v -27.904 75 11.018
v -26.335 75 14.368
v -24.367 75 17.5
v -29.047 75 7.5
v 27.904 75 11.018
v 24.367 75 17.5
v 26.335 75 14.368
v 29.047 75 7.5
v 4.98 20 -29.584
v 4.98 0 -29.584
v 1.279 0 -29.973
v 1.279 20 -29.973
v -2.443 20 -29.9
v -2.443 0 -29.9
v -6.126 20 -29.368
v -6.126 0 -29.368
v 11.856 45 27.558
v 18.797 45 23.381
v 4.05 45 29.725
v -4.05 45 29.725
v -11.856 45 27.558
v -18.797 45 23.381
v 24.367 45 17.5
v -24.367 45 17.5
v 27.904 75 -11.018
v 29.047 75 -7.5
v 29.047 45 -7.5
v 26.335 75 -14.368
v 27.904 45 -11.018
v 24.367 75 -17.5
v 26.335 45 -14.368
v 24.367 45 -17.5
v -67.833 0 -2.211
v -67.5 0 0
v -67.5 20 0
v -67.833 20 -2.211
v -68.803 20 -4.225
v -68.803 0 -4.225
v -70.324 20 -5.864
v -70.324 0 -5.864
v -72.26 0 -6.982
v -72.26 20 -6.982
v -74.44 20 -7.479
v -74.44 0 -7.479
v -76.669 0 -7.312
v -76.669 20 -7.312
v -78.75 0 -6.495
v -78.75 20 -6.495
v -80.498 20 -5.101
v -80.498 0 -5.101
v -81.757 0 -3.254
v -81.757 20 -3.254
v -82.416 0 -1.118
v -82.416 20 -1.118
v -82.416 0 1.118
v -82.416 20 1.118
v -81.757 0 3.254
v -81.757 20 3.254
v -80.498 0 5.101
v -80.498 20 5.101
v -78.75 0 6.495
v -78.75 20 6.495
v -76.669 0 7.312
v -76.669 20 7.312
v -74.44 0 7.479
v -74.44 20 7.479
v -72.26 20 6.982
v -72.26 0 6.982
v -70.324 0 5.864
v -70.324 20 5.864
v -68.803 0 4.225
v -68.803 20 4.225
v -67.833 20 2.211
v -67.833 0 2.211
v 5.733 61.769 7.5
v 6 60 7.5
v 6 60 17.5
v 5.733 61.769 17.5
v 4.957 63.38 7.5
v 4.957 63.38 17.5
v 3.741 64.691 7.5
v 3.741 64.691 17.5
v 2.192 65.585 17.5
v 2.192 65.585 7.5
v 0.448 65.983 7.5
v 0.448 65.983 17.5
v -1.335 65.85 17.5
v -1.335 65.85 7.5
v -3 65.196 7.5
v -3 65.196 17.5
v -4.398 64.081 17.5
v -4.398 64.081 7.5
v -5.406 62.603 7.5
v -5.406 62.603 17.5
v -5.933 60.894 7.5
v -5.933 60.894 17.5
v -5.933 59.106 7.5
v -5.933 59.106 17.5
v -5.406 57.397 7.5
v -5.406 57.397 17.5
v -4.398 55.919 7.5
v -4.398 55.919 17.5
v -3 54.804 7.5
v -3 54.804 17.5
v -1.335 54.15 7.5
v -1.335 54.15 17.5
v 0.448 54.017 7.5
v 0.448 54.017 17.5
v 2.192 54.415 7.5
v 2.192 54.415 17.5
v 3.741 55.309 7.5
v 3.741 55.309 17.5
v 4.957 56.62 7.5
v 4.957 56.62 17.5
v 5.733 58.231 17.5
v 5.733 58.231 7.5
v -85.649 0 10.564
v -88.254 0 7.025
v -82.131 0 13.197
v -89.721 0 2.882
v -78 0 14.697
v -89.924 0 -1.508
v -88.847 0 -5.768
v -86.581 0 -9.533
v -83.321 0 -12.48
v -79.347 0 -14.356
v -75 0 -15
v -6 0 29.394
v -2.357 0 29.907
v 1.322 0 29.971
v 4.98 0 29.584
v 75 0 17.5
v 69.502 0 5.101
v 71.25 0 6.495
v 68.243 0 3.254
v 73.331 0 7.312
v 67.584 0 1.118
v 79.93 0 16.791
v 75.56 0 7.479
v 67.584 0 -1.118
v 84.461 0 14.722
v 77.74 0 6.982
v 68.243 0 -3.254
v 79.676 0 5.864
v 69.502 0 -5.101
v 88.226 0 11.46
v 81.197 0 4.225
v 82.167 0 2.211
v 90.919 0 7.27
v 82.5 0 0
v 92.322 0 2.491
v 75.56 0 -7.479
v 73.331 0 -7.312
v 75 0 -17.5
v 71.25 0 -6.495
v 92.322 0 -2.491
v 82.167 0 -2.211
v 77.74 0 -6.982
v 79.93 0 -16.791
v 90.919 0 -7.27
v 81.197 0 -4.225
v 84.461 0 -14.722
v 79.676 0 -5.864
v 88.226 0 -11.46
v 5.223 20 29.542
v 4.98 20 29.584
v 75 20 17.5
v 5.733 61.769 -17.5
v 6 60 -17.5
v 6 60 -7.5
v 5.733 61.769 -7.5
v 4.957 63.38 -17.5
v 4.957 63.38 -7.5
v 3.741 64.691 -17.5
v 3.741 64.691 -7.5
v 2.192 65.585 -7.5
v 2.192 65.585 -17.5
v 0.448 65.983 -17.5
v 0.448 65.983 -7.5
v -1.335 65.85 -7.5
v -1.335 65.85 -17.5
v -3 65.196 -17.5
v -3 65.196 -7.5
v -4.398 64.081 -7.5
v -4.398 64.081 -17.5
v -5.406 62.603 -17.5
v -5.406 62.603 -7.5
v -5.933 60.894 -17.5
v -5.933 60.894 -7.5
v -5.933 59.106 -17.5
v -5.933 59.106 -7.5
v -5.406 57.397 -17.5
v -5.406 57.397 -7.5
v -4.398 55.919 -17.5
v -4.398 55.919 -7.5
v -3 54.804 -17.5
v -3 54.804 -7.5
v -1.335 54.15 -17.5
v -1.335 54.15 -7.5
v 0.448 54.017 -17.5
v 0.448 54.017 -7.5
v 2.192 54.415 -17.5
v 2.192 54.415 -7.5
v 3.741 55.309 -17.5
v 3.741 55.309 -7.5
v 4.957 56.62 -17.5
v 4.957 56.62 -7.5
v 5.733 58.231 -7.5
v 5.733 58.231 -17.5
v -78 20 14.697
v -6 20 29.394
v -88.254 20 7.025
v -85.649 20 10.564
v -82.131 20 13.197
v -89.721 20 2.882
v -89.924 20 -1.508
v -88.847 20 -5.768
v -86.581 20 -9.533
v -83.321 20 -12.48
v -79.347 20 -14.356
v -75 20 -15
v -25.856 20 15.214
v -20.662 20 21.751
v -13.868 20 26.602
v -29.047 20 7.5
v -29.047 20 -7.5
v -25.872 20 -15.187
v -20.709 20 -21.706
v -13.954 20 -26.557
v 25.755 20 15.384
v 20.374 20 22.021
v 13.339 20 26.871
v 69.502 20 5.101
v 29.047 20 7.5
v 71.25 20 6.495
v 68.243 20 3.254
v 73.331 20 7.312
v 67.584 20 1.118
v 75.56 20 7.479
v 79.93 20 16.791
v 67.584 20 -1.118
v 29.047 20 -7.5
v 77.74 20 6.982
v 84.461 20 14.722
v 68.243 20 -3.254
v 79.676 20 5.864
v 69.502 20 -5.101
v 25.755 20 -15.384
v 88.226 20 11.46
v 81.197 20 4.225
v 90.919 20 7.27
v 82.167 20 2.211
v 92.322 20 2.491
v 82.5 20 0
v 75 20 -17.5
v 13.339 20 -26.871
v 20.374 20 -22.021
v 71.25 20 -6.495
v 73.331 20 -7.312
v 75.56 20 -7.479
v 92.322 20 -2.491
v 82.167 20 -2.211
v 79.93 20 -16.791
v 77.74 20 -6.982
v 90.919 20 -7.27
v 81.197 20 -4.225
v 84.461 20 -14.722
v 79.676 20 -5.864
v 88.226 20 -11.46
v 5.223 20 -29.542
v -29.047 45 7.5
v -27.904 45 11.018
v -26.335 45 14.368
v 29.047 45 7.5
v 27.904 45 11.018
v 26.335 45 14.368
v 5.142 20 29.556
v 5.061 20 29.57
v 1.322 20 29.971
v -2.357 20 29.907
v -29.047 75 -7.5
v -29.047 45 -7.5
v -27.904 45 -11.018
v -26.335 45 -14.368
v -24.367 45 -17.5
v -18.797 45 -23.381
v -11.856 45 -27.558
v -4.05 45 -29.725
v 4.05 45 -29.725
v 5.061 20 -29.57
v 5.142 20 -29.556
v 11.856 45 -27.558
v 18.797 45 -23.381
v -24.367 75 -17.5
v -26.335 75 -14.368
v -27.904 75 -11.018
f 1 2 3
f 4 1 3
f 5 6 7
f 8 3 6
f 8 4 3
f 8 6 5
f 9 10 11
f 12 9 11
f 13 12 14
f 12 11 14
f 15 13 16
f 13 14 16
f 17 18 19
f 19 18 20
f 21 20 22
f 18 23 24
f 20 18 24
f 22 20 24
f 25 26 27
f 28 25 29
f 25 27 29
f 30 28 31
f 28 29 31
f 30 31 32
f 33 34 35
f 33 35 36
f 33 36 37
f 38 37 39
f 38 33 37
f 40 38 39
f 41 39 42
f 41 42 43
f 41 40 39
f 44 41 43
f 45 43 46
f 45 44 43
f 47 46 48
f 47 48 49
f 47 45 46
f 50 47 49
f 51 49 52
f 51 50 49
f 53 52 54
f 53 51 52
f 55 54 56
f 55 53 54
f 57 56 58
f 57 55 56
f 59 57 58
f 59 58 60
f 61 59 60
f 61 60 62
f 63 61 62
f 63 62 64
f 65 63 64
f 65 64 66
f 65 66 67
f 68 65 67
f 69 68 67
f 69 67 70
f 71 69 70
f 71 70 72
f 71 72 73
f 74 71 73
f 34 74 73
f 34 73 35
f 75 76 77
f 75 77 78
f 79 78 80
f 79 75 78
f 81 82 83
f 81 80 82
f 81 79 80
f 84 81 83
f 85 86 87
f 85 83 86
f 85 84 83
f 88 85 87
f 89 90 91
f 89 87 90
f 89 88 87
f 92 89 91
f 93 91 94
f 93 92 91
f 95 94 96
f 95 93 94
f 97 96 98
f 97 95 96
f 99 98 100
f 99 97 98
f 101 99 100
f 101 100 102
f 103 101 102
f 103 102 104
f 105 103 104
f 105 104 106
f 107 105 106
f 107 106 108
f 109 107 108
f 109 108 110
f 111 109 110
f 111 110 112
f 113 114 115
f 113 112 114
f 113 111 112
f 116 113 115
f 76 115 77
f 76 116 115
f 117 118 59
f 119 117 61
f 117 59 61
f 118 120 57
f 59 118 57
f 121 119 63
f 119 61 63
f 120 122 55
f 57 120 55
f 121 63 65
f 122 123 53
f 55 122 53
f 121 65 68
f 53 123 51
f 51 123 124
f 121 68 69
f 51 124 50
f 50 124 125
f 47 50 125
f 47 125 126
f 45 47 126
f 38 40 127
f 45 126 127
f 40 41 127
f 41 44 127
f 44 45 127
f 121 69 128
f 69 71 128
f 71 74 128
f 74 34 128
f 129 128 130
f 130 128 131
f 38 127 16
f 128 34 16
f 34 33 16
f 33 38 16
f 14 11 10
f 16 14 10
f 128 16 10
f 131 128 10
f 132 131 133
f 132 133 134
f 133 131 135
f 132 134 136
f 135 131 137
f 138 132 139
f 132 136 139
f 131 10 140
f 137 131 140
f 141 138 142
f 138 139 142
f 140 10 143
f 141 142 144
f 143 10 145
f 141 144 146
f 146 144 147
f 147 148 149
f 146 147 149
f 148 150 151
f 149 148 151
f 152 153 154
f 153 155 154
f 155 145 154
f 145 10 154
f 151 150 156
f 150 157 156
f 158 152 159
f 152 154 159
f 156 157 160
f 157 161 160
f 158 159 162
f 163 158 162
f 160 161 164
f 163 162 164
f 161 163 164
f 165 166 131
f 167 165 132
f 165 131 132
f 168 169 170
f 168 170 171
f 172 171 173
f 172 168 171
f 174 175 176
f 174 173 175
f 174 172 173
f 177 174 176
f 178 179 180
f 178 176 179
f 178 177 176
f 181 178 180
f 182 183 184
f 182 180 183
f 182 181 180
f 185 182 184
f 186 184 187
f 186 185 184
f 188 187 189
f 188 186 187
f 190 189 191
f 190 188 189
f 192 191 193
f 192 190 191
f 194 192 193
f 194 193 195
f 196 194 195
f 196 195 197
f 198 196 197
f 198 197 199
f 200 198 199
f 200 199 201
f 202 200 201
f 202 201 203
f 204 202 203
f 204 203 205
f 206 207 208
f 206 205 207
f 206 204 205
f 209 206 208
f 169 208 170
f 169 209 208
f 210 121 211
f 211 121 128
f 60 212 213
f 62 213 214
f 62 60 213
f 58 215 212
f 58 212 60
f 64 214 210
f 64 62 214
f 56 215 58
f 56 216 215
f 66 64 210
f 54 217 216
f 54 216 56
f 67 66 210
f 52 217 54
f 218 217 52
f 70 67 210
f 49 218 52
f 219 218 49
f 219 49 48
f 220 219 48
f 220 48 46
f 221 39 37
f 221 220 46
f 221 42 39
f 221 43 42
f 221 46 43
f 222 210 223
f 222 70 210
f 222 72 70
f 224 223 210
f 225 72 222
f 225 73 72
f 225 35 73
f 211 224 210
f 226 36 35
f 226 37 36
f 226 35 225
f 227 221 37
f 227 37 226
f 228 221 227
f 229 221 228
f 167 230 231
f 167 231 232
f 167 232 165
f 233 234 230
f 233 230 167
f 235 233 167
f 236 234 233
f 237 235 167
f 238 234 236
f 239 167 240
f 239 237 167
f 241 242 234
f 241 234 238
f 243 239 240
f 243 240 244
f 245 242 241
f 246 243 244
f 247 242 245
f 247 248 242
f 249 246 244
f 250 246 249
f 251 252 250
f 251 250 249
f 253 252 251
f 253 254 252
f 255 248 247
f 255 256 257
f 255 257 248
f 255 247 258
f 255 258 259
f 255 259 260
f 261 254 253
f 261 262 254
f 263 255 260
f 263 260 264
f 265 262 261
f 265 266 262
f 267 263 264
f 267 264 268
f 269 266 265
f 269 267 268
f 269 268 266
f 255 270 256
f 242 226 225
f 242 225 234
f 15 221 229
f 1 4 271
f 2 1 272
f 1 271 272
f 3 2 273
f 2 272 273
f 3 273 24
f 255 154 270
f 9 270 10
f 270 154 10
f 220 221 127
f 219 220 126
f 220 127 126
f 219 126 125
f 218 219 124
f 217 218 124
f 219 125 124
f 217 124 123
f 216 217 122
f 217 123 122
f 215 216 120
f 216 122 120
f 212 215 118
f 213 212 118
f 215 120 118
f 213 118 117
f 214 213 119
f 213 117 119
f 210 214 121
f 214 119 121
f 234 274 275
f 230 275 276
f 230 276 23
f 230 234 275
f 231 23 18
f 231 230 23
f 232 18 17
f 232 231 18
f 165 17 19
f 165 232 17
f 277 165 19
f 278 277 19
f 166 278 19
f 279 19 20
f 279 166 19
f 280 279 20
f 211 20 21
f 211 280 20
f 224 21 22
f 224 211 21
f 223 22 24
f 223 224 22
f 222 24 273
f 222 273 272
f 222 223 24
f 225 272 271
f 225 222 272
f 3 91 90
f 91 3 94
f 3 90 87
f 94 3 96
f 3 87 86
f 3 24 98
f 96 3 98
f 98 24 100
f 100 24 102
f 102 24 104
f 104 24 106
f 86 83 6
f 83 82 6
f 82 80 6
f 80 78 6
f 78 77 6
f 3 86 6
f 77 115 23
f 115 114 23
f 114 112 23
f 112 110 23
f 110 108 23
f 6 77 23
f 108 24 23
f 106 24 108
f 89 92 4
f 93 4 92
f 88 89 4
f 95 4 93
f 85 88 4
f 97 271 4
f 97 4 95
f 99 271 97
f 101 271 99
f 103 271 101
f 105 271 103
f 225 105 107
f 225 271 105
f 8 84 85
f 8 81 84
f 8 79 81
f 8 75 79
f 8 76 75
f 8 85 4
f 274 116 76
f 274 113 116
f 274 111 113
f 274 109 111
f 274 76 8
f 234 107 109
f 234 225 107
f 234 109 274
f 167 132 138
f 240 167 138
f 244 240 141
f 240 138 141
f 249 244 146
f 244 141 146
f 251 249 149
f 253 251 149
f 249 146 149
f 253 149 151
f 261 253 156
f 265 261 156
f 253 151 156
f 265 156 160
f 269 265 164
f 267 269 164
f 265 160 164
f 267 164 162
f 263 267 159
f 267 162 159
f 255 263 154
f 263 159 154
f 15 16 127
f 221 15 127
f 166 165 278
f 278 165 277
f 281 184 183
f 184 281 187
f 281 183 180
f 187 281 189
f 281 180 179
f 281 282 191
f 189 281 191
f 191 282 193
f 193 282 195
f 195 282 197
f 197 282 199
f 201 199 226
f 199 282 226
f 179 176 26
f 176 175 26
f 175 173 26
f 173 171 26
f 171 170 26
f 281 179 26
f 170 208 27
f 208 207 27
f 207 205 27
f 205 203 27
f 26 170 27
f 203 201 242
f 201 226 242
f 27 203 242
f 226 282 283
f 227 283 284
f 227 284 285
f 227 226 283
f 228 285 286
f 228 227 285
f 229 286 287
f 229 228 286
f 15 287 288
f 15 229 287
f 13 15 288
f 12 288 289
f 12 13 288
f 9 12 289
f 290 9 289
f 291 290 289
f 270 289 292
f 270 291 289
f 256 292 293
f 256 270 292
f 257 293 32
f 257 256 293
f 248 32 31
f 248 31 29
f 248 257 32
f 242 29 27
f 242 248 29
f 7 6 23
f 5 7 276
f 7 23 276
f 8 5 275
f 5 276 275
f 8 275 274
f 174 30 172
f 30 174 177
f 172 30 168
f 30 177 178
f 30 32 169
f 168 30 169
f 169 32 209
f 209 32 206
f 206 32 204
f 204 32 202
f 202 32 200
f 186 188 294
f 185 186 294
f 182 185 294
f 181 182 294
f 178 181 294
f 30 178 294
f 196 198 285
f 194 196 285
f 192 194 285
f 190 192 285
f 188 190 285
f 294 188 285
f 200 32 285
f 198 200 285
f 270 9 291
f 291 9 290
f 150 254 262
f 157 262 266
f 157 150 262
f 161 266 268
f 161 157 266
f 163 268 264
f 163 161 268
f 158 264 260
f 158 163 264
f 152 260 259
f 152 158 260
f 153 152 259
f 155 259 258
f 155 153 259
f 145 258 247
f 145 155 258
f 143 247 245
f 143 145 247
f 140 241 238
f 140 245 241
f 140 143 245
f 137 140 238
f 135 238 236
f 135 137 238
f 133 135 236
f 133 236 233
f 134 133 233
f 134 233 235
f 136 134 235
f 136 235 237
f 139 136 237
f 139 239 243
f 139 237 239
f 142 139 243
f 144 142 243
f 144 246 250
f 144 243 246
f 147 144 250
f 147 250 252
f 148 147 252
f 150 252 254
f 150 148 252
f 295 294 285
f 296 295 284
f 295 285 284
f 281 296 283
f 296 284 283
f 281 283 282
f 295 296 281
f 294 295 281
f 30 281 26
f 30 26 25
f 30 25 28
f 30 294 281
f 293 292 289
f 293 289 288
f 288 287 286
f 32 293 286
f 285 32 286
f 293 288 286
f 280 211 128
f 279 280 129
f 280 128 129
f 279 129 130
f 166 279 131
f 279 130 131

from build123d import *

# Parameters (mm, degrees)
SALIENTE_EXTRUIR1_OUTLINE_R = 7.5
SALIENTE_EXTRUIR1_DEPTH     = 20
SALIENTE_EXTRUIR2_START     = 20
CROQUIS2_4_R                = 7.5
SALIENTE_EXTRUIR2_DEPTH     = 25
SALIENTE_EXTRUIR3_START     = 45
SALIENTE_EXTRUIR3_DEPTH     = 30
CORTAR_EXTRUIR1_DEPTH       = 123.805740908
CORTAR_EXTRUIR1_DEPTH_BACK  = 123.805740908
CROQUIS3_R                  = 6


# Read off the part's stored shape, not the designer's step: Saliente-Extruir1
with BuildPart() as part:
    # Saliente-Extruir1 outline → Saliente-Extruir1 (new body)
    with BuildSketch(Plane(origin=(0, 0, 0), x_dir=(1, 0, 0), z_dir=(0, 1, 0))):
        with BuildLine():
            Line((75, 17.5), (4.980303505, 29.583721487))
            ThreePointArc((4.980303505, 29.583721487), (-0.583157592, 29.994331585), (-6.126453941, 29.367781021))
            Line((-6.126453941, 29.367781021), (-75, 15))
            ThreePointArc((-75, 15), (-89.924042295, 1.50763443), (-78, -14.696938457))
            Line((-78, -14.696938457), (-6, -29.393876913))
            ThreePointArc((-6, -29.393876913), (-0.518609175, -29.995517074), (4.980303505, -29.583721487))
            Line((4.980303505, -29.583721487), (75, -17.5))
            ThreePointArc((75, -17.5), (92.5, 0), (75, 17.5))
        make_face()
        with Locations((-75, 0)):
            Circle(SALIENTE_EXTRUIR1_OUTLINE_R, mode=Mode.SUBTRACT)
        with Locations((75, 0)):
            Circle(SALIENTE_EXTRUIR1_OUTLINE_R, mode=Mode.SUBTRACT)
    extrude(amount=SALIENTE_EXTRUIR1_DEPTH)

    # Croquis2<4> → Saliente-Extruir2 (add)
    with BuildSketch(Plane(origin=(0, 0, 0), x_dir=(1, 0, 0), z_dir=(0, 1, 0)).offset(SALIENTE_EXTRUIR2_START)):
        with Locations(Location((-75, 0, 0), (0, 0, 270))):
            Circle(CROQUIS2_4_R)
        with Locations(Location((75, 0, 0), (0, 0, 270))):
            Circle(CROQUIS2_4_R)
        with BuildLine():
            Line((29.047375097, 7.5), (-29.047375097, 7.5))
            ThreePointArc((-29.047375097, 7.5), (0, 30), (29.047375097, 7.5))
        make_face()
        with BuildLine():
            Line((-29.047375097, -7.5), (29.047375097, -7.5))
            ThreePointArc((29.047375097, -7.5), (0, -30), (-29.047375097, -7.5))
        make_face()
    extrude(amount=SALIENTE_EXTRUIR2_DEPTH)


with BuildPart() as saliente_extruir2_kept_piece:
    # of the separate pieces the step leaves, the one the design keeps (saliente_extruir2_pieces_kept)
    add(part.part.solids().sort_by_distance((4.980303505, 0, 29.583721487))[0])

    # Croquis2<5> → Saliente-Extruir3 (add)
    with BuildSketch(Plane(origin=(0, 0, 0), x_dir=(1, 0, 0), z_dir=(0, 1, 0)).offset(SALIENTE_EXTRUIR3_START)):
        with BuildLine():
            Line((24.366985862, 17.5), (-24.366985862, 17.5))
            ThreePointArc((-24.366985862, 17.5), (-27.171188586, 12.717173855), (-29.047375097, 7.5))
            Line((-29.047375097, 7.5), (29.047375097, 7.5))
            ThreePointArc((29.047375097, 7.5), (27.171188586, 12.717173855), (24.366985862, 17.5))
        make_face()
        with BuildLine():
            ThreePointArc((-29.047375097, -7.5), (-27.171188586, -12.717173855), (-24.366985862, -17.5))
            Line((-24.366985862, -17.5), (24.366985862, -17.5))
            ThreePointArc((24.366985862, -17.5), (27.171188586, -12.717173855), (29.047375097, -7.5))
            Line((29.047375097, -7.5), (-29.047375097, -7.5))
        make_face()
    extrude(amount=SALIENTE_EXTRUIR3_DEPTH)

    # Croquis3 → Cortar-Extruir1 (cut, two sides: drawn at the far end of the back side and taken through both)
    with BuildSketch(Plane.XY.offset(-CORTAR_EXTRUIR1_DEPTH_BACK)):
        with Locations((0, 60)):
            Circle(CROQUIS3_R)
    extrude(amount=CORTAR_EXTRUIR1_DEPTH + CORTAR_EXTRUIR1_DEPTH_BACK, mode=Mode.SUBTRACT)


solid = saliente_extruir2_kept_piece.part
